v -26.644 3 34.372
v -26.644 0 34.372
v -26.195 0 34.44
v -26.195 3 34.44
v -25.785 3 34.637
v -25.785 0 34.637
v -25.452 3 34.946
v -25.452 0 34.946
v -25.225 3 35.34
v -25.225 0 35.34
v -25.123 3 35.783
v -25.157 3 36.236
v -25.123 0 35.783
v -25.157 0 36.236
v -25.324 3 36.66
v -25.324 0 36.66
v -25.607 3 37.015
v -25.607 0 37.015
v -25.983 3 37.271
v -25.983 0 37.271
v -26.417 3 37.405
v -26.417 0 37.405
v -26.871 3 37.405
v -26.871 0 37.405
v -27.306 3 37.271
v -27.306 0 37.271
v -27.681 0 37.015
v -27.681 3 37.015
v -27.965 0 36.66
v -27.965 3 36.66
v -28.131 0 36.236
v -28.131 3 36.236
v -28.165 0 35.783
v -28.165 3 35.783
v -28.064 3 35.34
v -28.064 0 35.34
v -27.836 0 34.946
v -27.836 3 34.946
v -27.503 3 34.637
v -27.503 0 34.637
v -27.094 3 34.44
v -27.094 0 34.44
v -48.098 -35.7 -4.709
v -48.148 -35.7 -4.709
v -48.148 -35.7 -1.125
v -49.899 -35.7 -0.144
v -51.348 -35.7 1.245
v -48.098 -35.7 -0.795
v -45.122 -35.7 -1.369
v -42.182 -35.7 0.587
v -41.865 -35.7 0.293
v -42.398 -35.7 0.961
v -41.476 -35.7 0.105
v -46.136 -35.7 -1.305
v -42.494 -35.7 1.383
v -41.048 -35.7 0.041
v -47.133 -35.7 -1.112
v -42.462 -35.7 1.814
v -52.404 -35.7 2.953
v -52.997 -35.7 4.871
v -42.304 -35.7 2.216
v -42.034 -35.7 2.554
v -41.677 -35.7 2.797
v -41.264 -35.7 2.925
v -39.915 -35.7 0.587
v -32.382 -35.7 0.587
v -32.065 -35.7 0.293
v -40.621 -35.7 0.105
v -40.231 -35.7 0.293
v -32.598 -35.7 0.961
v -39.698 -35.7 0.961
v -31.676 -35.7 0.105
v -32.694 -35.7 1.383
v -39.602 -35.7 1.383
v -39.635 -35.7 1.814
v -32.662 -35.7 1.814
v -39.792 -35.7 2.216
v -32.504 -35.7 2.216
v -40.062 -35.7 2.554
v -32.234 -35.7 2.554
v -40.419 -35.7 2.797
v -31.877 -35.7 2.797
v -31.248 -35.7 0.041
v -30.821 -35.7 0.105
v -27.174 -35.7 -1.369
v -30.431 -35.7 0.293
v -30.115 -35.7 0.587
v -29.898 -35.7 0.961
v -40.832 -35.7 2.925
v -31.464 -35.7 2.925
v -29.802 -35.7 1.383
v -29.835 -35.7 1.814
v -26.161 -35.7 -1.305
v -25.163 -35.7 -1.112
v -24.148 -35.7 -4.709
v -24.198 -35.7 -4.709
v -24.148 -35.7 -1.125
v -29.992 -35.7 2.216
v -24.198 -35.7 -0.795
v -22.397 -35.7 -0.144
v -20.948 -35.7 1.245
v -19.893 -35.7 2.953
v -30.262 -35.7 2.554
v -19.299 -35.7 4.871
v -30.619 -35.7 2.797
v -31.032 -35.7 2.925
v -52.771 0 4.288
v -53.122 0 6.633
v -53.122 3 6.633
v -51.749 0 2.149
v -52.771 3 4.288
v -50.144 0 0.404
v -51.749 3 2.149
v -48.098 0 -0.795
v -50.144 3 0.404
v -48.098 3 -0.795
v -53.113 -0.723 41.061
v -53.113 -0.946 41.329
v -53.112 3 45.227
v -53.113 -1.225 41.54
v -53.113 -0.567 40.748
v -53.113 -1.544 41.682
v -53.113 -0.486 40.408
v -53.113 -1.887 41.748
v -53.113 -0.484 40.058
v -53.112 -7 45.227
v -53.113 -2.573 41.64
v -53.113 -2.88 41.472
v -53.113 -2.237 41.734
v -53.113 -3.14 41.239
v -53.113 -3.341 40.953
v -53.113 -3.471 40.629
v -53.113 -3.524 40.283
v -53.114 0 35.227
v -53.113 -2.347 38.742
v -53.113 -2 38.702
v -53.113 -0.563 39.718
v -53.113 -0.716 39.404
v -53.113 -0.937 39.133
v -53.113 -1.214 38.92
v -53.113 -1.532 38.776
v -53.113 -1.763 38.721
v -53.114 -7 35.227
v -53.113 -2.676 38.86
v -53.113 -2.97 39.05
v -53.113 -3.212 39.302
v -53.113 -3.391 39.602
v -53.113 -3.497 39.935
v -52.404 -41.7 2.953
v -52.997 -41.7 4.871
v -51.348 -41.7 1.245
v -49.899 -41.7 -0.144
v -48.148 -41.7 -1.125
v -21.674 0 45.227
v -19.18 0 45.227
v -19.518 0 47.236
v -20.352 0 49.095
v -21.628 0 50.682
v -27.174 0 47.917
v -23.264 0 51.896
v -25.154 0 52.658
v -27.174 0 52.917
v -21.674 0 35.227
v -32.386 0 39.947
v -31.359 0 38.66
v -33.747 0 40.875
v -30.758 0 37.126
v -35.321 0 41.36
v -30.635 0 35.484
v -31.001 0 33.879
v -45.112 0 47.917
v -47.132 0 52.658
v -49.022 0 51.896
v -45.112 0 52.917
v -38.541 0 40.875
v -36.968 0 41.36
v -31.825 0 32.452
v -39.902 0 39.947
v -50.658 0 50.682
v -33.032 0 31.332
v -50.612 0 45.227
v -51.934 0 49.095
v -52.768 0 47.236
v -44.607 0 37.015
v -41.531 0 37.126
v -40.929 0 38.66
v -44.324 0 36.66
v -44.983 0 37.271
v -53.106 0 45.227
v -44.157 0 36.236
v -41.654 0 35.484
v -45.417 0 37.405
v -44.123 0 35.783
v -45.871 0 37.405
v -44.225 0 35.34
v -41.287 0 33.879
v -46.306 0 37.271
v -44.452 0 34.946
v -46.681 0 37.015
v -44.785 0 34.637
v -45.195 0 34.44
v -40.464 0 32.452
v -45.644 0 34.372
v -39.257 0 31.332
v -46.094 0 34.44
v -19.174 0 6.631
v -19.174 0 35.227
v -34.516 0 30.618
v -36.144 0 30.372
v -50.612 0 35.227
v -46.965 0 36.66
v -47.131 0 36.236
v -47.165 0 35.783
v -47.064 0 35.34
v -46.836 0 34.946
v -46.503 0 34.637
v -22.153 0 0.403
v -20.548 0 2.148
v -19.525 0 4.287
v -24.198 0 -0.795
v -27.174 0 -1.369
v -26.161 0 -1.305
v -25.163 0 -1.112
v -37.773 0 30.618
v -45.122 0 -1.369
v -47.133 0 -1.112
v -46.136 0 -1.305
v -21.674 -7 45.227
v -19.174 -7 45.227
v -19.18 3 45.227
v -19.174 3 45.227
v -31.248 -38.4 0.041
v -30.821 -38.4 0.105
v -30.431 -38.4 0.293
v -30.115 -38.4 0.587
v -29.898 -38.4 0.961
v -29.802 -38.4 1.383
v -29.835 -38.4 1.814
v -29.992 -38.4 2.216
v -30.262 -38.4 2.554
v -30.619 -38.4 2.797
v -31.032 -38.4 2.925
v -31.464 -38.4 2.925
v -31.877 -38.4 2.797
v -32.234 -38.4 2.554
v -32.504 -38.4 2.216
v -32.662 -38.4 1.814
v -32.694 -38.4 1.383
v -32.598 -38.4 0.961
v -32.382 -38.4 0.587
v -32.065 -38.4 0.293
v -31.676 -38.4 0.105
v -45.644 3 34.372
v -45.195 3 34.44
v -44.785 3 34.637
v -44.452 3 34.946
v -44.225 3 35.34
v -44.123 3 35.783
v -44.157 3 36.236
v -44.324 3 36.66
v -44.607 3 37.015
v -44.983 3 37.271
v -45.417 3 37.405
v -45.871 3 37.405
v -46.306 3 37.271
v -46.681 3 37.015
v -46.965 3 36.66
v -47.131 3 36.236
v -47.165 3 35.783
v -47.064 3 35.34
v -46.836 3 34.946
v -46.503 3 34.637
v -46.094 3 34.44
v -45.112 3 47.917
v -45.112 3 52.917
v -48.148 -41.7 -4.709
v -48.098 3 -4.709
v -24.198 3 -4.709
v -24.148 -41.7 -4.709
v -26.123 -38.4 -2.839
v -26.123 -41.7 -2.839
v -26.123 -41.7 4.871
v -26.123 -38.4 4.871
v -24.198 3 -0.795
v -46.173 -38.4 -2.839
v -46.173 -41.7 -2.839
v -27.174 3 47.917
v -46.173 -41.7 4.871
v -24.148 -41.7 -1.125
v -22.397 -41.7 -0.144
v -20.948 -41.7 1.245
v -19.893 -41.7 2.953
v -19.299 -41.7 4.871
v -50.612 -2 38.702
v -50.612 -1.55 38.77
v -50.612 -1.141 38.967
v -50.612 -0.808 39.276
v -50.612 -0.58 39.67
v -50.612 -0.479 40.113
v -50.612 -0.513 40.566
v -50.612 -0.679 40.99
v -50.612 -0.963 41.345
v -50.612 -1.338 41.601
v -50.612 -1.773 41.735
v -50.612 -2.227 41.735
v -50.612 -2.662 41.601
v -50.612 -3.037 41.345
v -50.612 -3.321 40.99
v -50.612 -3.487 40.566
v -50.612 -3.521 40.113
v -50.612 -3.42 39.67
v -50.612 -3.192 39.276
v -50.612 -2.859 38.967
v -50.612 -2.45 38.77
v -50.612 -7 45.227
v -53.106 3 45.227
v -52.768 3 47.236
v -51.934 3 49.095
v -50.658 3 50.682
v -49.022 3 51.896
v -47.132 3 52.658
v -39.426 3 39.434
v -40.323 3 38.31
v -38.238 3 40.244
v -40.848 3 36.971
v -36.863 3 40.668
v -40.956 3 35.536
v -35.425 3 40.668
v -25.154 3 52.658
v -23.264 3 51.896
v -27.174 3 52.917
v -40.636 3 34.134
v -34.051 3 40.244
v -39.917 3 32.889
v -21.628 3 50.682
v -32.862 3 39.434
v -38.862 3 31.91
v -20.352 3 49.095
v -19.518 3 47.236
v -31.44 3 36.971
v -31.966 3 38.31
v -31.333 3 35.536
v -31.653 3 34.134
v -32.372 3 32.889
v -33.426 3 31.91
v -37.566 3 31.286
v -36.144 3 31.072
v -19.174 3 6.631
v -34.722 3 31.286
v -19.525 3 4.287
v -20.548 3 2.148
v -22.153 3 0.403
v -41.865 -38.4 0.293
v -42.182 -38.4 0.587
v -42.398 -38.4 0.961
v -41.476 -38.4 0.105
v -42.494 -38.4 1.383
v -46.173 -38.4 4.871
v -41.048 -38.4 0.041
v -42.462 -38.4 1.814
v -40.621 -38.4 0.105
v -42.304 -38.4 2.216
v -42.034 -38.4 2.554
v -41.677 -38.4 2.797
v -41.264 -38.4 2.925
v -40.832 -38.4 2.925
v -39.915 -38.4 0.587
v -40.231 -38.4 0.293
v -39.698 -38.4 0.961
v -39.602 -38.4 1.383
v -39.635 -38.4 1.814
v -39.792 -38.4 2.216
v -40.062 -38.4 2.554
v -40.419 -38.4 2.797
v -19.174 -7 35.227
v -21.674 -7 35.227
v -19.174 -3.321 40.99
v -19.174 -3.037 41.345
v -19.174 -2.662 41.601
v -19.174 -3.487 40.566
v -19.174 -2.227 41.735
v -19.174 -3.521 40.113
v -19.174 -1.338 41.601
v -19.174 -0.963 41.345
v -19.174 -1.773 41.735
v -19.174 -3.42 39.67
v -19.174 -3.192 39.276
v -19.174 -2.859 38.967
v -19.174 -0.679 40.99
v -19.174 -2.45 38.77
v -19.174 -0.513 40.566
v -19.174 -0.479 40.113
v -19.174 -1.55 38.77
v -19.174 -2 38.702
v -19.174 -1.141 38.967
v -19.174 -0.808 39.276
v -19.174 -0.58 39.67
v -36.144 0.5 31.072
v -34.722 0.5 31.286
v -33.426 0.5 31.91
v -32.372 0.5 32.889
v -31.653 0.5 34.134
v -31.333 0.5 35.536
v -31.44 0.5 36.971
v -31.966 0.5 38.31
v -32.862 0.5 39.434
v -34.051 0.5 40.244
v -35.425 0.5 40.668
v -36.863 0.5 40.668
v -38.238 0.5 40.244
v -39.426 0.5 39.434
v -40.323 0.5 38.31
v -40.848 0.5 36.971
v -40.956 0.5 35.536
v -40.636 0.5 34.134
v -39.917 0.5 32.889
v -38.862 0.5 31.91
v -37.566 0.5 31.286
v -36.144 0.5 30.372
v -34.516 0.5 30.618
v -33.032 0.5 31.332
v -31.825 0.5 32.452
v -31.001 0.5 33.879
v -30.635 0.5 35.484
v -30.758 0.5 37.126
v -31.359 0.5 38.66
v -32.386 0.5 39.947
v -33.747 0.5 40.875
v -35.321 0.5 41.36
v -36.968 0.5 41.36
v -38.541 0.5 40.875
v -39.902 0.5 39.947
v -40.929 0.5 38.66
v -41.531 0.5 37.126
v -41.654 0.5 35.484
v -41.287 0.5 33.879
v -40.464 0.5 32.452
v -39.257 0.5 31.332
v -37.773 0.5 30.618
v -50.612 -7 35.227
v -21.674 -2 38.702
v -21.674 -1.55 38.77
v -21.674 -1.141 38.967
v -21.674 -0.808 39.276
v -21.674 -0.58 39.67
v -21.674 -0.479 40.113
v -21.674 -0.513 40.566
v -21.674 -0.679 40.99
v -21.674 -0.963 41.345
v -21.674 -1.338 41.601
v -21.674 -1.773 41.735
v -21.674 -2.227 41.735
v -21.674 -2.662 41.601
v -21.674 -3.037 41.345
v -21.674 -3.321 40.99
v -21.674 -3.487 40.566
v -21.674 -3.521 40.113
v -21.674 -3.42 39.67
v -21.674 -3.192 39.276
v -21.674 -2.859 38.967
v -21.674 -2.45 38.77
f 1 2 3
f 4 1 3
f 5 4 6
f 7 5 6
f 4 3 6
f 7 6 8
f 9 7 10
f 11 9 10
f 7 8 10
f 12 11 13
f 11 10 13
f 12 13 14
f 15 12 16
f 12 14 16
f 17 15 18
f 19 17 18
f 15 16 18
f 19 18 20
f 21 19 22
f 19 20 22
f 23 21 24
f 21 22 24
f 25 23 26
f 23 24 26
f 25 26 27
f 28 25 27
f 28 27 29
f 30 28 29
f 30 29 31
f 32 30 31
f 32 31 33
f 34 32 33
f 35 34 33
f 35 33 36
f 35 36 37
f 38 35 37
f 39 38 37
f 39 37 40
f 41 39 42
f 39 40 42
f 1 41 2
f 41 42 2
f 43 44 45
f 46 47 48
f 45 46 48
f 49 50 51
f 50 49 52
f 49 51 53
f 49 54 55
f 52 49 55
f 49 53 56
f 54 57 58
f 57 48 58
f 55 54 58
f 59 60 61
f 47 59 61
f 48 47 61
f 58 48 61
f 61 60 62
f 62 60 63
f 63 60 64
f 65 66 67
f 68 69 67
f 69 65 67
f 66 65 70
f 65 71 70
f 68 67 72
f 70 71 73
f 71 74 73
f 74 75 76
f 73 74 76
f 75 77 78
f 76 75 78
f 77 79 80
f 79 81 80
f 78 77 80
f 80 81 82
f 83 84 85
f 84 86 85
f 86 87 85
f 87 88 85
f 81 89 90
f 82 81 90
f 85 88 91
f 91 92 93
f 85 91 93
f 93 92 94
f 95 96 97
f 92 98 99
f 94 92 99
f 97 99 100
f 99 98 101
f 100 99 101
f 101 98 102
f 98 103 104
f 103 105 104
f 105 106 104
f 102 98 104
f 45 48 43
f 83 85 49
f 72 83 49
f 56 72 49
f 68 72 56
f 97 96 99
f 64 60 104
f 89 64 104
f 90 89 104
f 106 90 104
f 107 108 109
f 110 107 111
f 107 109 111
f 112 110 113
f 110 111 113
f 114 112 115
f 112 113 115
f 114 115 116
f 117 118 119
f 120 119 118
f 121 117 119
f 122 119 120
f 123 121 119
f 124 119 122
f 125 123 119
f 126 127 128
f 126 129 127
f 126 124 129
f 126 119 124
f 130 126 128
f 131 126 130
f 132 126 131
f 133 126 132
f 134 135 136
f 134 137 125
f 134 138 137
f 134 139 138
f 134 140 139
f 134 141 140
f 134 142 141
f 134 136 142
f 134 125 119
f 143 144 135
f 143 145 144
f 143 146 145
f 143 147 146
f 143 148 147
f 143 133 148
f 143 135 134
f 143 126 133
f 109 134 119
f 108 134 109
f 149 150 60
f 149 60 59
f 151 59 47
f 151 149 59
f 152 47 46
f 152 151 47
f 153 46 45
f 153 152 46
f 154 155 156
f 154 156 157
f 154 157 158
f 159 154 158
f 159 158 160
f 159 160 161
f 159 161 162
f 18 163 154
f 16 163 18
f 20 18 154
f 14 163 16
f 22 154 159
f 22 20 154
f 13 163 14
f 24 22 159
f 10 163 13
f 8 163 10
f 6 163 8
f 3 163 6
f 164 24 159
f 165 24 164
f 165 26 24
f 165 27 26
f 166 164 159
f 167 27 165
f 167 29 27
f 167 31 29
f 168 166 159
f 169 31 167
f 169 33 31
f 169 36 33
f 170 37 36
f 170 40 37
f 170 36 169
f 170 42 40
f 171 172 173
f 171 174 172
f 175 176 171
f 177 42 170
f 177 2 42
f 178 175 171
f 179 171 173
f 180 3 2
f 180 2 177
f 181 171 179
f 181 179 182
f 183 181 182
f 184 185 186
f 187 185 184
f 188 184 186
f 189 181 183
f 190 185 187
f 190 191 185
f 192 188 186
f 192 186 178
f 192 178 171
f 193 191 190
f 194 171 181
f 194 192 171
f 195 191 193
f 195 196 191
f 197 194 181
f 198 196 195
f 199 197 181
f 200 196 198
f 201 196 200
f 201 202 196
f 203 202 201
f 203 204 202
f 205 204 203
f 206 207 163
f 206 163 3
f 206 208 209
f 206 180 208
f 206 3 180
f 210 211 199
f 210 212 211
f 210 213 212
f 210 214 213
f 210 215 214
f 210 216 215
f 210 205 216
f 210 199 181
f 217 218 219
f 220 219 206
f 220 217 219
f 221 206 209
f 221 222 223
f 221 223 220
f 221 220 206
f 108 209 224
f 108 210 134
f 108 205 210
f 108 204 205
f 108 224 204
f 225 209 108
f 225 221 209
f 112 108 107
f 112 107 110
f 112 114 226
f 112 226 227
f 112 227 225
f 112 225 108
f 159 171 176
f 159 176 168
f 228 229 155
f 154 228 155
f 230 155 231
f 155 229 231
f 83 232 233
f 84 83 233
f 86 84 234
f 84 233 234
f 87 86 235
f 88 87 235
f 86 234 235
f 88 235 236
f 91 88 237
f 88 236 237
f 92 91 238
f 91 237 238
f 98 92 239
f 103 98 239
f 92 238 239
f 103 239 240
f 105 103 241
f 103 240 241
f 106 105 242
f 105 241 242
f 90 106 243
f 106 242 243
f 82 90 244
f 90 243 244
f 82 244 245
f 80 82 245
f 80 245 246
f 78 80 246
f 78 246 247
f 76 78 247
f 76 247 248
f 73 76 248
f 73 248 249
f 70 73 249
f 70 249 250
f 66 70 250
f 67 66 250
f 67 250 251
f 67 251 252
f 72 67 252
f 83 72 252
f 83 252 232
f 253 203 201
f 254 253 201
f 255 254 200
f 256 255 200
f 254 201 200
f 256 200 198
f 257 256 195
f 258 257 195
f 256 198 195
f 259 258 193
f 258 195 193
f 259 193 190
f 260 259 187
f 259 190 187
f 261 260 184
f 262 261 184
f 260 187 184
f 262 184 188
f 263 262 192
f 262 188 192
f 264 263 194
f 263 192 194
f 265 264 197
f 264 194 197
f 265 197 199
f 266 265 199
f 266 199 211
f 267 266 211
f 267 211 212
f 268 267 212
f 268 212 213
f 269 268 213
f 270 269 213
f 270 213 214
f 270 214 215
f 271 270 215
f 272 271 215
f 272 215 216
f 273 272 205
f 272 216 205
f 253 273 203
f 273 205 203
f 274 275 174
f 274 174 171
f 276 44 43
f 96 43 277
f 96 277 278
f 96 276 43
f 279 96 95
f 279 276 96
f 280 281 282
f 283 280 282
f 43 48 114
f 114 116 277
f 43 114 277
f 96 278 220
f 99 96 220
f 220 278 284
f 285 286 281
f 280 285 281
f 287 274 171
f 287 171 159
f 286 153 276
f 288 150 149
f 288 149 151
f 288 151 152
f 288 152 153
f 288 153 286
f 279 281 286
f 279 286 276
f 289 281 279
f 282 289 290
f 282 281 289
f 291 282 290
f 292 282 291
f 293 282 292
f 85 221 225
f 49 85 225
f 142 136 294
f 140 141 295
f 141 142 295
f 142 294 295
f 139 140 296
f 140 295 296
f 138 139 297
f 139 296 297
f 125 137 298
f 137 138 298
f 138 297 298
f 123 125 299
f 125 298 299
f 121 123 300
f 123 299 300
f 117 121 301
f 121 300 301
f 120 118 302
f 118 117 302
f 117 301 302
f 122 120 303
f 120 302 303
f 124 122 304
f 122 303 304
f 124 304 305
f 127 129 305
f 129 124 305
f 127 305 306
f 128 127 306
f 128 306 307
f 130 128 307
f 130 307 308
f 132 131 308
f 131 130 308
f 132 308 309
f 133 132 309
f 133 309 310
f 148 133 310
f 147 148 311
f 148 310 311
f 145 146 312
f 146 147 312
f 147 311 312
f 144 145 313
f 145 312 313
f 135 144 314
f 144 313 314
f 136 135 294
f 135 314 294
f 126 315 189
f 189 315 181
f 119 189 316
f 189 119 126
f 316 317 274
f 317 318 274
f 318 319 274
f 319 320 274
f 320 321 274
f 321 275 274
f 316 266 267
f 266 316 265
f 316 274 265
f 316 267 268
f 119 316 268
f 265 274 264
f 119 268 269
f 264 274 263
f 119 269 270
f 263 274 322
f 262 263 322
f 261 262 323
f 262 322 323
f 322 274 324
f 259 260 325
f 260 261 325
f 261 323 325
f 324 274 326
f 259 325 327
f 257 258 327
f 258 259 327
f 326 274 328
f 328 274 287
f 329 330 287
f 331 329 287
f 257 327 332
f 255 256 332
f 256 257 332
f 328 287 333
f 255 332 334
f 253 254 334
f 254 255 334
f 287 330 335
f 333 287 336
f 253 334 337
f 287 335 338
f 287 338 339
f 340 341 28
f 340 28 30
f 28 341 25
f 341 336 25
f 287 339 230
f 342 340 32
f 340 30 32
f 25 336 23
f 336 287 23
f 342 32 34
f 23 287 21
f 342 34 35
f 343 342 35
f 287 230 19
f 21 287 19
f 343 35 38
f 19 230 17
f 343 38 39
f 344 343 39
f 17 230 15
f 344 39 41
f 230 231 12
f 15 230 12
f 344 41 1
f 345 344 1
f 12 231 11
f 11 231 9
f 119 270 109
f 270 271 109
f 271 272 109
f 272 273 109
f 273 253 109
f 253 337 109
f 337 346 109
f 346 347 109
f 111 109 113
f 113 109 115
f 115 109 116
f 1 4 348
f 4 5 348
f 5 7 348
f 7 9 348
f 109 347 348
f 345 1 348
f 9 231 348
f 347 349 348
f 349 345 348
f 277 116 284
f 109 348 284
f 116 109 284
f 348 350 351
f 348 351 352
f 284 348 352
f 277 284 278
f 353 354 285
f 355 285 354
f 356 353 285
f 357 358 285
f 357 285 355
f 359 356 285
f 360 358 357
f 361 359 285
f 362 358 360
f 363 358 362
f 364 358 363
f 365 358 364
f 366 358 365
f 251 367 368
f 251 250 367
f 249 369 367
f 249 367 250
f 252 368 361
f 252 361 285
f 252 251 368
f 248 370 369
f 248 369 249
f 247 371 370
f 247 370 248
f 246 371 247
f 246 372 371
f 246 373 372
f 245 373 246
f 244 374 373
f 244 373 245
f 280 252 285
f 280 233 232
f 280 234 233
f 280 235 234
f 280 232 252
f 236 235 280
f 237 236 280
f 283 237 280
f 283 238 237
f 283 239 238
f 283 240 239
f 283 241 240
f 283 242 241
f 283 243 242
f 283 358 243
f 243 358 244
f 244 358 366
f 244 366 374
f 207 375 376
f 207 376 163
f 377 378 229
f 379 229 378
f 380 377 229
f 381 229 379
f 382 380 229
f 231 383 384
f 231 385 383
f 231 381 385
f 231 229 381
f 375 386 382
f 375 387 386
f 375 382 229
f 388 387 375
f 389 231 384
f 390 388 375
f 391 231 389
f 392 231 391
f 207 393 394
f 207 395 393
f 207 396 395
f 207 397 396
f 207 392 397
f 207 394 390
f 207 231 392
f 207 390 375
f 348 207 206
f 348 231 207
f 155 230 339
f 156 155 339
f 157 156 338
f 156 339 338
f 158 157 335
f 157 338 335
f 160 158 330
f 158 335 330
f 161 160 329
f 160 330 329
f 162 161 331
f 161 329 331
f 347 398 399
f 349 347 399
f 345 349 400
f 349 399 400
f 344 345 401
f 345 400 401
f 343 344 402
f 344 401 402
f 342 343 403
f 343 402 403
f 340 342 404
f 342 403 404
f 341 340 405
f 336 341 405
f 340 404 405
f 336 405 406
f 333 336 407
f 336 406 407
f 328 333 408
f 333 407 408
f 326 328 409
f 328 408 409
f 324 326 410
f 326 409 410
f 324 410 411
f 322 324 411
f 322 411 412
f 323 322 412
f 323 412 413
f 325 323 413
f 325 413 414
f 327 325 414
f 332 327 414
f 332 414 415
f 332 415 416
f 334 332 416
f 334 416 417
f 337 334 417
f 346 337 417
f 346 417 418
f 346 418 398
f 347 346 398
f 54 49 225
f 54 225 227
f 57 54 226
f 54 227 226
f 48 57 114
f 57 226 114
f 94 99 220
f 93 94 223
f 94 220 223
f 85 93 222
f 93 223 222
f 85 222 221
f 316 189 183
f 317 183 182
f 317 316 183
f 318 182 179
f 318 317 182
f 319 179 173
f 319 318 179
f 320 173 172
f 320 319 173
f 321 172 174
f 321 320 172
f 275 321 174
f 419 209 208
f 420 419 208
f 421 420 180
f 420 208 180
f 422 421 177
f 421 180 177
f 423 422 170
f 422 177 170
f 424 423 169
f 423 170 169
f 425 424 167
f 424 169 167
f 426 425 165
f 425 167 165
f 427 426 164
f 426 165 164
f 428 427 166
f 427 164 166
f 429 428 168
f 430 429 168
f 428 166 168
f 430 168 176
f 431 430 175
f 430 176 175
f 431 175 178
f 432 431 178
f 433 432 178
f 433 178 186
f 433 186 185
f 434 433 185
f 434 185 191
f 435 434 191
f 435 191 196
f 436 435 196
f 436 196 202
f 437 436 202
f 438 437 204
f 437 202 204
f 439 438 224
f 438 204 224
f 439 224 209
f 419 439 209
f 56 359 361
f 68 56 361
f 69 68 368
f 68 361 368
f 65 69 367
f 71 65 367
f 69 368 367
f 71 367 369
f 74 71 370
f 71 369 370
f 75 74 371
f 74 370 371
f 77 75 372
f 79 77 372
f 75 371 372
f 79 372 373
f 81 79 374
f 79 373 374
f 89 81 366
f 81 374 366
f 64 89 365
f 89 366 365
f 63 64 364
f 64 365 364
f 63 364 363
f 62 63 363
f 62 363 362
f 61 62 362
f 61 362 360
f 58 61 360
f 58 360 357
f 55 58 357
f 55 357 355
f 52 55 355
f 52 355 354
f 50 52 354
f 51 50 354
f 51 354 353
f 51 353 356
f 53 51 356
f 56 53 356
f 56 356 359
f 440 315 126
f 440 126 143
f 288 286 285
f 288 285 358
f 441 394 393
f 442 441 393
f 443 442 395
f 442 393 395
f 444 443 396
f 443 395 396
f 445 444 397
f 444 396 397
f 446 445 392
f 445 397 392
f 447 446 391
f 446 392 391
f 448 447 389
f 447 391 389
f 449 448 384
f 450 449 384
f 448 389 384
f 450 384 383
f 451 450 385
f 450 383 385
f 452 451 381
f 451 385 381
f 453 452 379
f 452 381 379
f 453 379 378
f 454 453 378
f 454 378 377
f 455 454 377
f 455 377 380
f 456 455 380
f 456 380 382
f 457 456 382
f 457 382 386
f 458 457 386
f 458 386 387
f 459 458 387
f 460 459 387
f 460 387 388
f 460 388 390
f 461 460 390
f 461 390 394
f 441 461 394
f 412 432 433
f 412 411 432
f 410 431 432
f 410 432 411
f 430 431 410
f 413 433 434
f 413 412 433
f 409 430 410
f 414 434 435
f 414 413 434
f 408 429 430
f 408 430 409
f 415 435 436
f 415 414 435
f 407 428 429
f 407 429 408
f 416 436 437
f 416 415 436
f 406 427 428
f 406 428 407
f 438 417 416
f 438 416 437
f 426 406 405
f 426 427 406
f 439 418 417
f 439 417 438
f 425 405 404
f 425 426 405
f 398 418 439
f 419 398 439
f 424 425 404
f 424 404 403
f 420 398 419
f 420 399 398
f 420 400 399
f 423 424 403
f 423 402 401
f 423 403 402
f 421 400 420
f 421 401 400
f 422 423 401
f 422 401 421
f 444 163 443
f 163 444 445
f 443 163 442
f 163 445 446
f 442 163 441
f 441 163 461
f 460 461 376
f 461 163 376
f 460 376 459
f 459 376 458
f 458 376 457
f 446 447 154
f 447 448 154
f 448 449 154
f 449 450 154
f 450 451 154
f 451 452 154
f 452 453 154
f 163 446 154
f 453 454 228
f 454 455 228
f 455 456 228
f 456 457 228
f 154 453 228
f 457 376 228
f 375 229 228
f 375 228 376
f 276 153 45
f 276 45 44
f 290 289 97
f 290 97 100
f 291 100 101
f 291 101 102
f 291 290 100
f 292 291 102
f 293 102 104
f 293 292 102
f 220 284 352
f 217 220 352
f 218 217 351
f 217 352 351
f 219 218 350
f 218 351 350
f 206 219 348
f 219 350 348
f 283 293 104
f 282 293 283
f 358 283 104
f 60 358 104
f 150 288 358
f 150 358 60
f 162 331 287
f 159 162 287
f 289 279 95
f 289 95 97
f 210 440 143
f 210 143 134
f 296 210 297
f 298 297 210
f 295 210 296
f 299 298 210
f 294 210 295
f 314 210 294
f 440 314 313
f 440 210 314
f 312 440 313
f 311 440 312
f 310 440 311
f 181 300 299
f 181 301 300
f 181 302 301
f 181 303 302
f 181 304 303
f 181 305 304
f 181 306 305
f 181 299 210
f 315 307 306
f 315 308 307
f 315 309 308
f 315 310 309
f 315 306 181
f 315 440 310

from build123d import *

# Parameters (mm, degrees)
BOSS_EXTRUDE2_DEPTH = 3
FILLET2_R           = 8
BOSS_EXTRUDE3_DEPTH = 44.7
SKETCH4_R           = 1.45
BOSS_EXTRUDE4_DEPTH = 6
SKETCH5_W           = 20.05
SKETCH5_H           = 7.70975521
SKETCH5_R           = 1.45
CUT_EXTRUDE2_DEPTH  = 3.3
BOSS_EXTRUDE5_REACH = 77.442
SKETCH7_W           = 10
SKETCH7_H           = 10
SKETCH7_R           = 1.525
CUT_EXTRUDE3_REACH  = 84.621
SKETCH8_W           = 28.937408921
SKETCH8_H           = 10
SKETCH11_R          = 1.525
SKETCH11_R_2        = 4.825
CUT_EXTRUDE4_DEPTH  = 3
SKETCH12_R          = 5.525
CUT_EXTRUDE5_DEPTH  = 0.5
SKETCH14_W          = 17.937492396
SKETCH14_H          = 5
CUT_EXTRUDE6_DEPTH  = 3


with BuildPart() as part:
    # Sketch2 → Boss-Extrude2 (new body)
    with BuildSketch(Plane(origin=(0, 0, 0), x_dir=(1, 0, 0), z_dir=(0, 1, 0))):
        Polygon((-53.10956872, -52.91705805), (-53.124237768, 1.36911662), (-19.174237768, 1.36911662), (-19.174237768, -52.91705805), align=None)
    extrude(amount=BOSS_EXTRUDE2_DEPTH)

    # Fillet2
    fillet2_edges = [part.edges().sort_by_distance(p)[0] for p in [
        (-53.10956872, 1.5, 52.91705805),
        (-53.124237768, 1.5, -1.36911662),
        (-19.174237768, 1.5, -1.36911662),
        (-19.174237768, 1.5, 52.91705805),
    ]]
    fillet(fillet2_edges, radius=FILLET2_R)

    # Sketch3 → Boss-Extrude3 (add)
    with BuildSketch(Plane(origin=(0, 3, 0), x_dir=(1, 0, 0), z_dir=(0, 1, 0))):
        with BuildLine():
            Line((-48.098156754, 4.70911662), (-24.198156754, 4.70911662))
            Line((-24.198156754, 4.70911662), (-24.198156754, 0.794945988))
            ThreePointArc((-24.198156754, 0.794945988), (-25.658756812, 1.224262543), (-27.174237768, 1.36911662))
            Line((-27.174237768, 1.36911662), (-45.12207574, 1.36911662))
            ThreePointArc((-45.12207574, 1.36911662), (-46.637556696, 1.224262543), (-48.098156754, 0.794945988))
            Line((-48.098156754, 0.794945988), (-48.098156754, 4.70911662))
        make_face()
    extrude(amount=-BOSS_EXTRUDE3_DEPTH)

    # Sketch4 → Boss-Extrude4 (add)
    with BuildSketch(Plane.XZ.offset(41.7)):
        with BuildLine():
            Line((-48.148156754, -1.125315107), (-48.148156754, -4.70911662))
            Line((-48.148156754, -4.70911662), (-24.148156754, -4.70911662))
            Line((-24.148156754, -4.70911662), (-24.148156754, -1.125315107))
            ThreePointArc((-24.148156754, -1.125315107), (-20.947846297, 1.245451192), (-19.298979621, 4.87088338))
            Line((-19.298979621, 4.87088338), (-52.997333887, 4.87088338))
            ThreePointArc((-52.997333887, 4.87088338), (-51.348467211, 1.245451192), (-48.148156754, -1.125315107))
        make_face()
        with Locations(Location((-41.048156754, 1.49088338, 0), (0, 0, 270))):
            Circle(SKETCH4_R, mode=Mode.SUBTRACT)
        with Locations(Location((-31.248156754, 1.49088338, 0), (0, 0, 270))):
            Circle(SKETCH4_R, mode=Mode.SUBTRACT)
    extrude(amount=-BOSS_EXTRUDE4_DEPTH)

    # Sketch5 → Cut-Extrude2 (cut)
    with BuildSketch(Plane.XZ.offset(41.7)):
        with Locations((-36.148152634, 1.016005775)):
            Rectangle(SKETCH5_W, SKETCH5_H)
        with Locations(Location((-31.248156754, 1.49088338, 0), (0, 0, 270))):
            Circle(SKETCH5_R, mode=Mode.SUBTRACT)
        with Locations(Location((-41.048156754, 1.49088338, 0), (0, 0, 270))):
            Circle(SKETCH5_R, mode=Mode.SUBTRACT)
    extrude(amount=-CUT_EXTRUDE2_DEPTH, mode=Mode.SUBTRACT)

    # Boss-Extrude5: up to this face of the body (flat: up to its plane)
    boss_extrude5_end = Plane(part.part.faces().sort_by_distance((-53.11690266, 1.5, 25.776132451))[0])
    # Sketch7 → Boss-Extrude5 (add, up to the picked face)
    with BuildSketch(Plane(origin=(-19.174237768, 0, 0), x_dir=(0, 0, -1), z_dir=(1, 0, 0)), mode=Mode.PRIVATE) as boss_extrude5_sk1:
        with Locations((-40.22705805, -2)):
            Rectangle(SKETCH7_W, SKETCH7_H)
        with Locations((-40.22705805, -2)):
            Circle(SKETCH7_R, mode=Mode.SUBTRACT)
    boss_extrude5_tool1 = split(extrude(boss_extrude5_sk1.sketch, amount=-BOSS_EXTRUDE5_REACH, mode=Mode.PRIVATE), bisect_by=boss_extrude5_end, keep=Keep.BOTH, mode=Mode.PRIVATE)
    add(boss_extrude5_tool1.solids().sort_by(Axis((-19.174238, 2.858579, 40.227058), (-1, 0, 0)))[0])

    # Cut-Extrude3: up to this face of the body (flat: up to its plane)
    cut_extrude3_end = Plane(part.part.faces().sort_by_distance((-36.146613335, 0, 17.301528841))[0])
    # Sketch8 → Cut-Extrude3 (cut, up to the picked face)
    with BuildSketch(Plane.XZ.offset(7), mode=Mode.PRIVATE) as cut_extrude3_sk1:
        with Locations((-36.142942229, 40.22705805)):
            Rectangle(SKETCH8_W, SKETCH8_H)
    cut_extrude3_tool1 = split(extrude(cut_extrude3_sk1.sketch, amount=-CUT_EXTRUDE3_REACH, mode=Mode.PRIVATE), bisect_by=cut_extrude3_end, keep=Keep.BOTH, mode=Mode.PRIVATE)
    add(cut_extrude3_tool1.solids().sort_by(Axis((-36.142942, -7, 40.227058), (0, 1, 0)))[0], mode=Mode.SUBTRACT)

    # Sketch11 → Cut-Extrude4 (cut)
    with BuildSketch(Plane.XZ):
        with Locations(Location((-45.644202791, 35.897058093, 0), (0, 0, 270))):
            Circle(SKETCH11_R)
        with Locations(Location((-26.644202791, 35.897058093, 0), (0, 0, 270))):
            Circle(SKETCH11_R)
        with Locations(Location((-36.144202791, 35.897058093, 0), (0, 0, 270))):
            Circle(SKETCH11_R_2)
    extrude(amount=-CUT_EXTRUDE4_DEPTH, mode=Mode.SUBTRACT)

    # Sketch12 → Cut-Extrude5 (cut)
    with BuildSketch(Plane.XZ):
        with Locations(Location((-36.144202791, 35.897058093, 0), (0, 0, 270))):
            Circle(SKETCH12_R)
    extrude(amount=-CUT_EXTRUDE5_DEPTH, mode=Mode.SUBTRACT)

    # Sketch14 → Cut-Extrude6 (cut)
    with BuildSketch(Plane(origin=(0, 3, 0), x_dir=(1, 0, 0), z_dir=(0, 1, 0))):
        with Locations((-36.142983966, -50.41705805)):
            Rectangle(SKETCH14_W, SKETCH14_H)
    extrude(amount=-CUT_EXTRUDE6_DEPTH, mode=Mode.SUBTRACT)


solid = part.part
